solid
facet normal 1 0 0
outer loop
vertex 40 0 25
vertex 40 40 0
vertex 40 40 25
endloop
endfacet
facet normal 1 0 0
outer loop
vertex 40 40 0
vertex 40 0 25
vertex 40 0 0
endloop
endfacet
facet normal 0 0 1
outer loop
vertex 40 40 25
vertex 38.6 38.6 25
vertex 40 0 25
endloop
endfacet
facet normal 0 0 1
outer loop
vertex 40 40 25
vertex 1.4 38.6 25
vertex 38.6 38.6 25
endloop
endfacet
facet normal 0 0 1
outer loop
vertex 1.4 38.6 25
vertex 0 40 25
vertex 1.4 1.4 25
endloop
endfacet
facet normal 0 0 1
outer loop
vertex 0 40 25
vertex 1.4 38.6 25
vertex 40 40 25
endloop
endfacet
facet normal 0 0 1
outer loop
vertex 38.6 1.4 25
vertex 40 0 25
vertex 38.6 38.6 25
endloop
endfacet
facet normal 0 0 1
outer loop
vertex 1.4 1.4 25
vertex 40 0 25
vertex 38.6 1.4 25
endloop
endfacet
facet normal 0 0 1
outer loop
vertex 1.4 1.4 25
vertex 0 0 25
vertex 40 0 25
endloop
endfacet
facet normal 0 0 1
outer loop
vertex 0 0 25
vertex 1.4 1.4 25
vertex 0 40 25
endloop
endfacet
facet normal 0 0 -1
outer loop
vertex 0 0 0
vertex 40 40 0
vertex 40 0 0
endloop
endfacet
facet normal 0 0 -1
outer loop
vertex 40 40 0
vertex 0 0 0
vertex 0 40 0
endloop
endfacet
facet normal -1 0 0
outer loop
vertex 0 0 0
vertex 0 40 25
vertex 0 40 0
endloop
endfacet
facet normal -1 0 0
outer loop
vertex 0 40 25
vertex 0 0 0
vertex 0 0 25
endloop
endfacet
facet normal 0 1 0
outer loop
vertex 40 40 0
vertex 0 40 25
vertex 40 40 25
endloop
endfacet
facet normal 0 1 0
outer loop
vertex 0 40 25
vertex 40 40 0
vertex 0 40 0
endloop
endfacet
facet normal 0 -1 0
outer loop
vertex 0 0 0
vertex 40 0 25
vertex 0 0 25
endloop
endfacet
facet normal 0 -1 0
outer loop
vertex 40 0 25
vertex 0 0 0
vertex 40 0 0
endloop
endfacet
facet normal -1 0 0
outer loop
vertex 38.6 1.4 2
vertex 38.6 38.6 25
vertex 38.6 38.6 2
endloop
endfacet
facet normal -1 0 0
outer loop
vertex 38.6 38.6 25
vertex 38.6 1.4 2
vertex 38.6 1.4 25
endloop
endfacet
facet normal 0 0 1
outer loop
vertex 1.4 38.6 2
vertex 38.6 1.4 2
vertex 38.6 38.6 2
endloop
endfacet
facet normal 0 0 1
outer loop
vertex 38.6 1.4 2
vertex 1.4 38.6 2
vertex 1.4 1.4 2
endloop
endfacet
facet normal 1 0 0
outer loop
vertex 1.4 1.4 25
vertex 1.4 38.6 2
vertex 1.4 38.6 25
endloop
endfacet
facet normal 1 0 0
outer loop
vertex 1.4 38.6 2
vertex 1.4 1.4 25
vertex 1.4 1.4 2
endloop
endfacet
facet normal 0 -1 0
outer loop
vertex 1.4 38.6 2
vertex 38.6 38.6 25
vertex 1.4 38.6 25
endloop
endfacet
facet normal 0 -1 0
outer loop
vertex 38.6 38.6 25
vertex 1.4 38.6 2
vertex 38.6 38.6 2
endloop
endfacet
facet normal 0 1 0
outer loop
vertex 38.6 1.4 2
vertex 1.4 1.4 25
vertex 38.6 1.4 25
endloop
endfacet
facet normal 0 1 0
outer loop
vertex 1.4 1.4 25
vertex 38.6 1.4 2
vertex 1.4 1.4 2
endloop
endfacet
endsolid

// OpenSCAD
$fn = 32;

// ----------------------------------------------------------------------
// Open box: 1.4 mm walls
// ----------------------------------------------------------------------

// --- parameters (mm) ---
box_l = 40;               // outer length, X
box_w = 40;               // outer width, Y
box_h = 25;               // outer height, Z
wall = 1.4;               // wall thickness
floor = 2;                // floor thickness

difference() {
  cube([box_l, box_w, box_h]);
  translate([wall, wall, floor])
    cube([box_l - 2 * wall, box_w - 2 * wall, box_h]);
}
